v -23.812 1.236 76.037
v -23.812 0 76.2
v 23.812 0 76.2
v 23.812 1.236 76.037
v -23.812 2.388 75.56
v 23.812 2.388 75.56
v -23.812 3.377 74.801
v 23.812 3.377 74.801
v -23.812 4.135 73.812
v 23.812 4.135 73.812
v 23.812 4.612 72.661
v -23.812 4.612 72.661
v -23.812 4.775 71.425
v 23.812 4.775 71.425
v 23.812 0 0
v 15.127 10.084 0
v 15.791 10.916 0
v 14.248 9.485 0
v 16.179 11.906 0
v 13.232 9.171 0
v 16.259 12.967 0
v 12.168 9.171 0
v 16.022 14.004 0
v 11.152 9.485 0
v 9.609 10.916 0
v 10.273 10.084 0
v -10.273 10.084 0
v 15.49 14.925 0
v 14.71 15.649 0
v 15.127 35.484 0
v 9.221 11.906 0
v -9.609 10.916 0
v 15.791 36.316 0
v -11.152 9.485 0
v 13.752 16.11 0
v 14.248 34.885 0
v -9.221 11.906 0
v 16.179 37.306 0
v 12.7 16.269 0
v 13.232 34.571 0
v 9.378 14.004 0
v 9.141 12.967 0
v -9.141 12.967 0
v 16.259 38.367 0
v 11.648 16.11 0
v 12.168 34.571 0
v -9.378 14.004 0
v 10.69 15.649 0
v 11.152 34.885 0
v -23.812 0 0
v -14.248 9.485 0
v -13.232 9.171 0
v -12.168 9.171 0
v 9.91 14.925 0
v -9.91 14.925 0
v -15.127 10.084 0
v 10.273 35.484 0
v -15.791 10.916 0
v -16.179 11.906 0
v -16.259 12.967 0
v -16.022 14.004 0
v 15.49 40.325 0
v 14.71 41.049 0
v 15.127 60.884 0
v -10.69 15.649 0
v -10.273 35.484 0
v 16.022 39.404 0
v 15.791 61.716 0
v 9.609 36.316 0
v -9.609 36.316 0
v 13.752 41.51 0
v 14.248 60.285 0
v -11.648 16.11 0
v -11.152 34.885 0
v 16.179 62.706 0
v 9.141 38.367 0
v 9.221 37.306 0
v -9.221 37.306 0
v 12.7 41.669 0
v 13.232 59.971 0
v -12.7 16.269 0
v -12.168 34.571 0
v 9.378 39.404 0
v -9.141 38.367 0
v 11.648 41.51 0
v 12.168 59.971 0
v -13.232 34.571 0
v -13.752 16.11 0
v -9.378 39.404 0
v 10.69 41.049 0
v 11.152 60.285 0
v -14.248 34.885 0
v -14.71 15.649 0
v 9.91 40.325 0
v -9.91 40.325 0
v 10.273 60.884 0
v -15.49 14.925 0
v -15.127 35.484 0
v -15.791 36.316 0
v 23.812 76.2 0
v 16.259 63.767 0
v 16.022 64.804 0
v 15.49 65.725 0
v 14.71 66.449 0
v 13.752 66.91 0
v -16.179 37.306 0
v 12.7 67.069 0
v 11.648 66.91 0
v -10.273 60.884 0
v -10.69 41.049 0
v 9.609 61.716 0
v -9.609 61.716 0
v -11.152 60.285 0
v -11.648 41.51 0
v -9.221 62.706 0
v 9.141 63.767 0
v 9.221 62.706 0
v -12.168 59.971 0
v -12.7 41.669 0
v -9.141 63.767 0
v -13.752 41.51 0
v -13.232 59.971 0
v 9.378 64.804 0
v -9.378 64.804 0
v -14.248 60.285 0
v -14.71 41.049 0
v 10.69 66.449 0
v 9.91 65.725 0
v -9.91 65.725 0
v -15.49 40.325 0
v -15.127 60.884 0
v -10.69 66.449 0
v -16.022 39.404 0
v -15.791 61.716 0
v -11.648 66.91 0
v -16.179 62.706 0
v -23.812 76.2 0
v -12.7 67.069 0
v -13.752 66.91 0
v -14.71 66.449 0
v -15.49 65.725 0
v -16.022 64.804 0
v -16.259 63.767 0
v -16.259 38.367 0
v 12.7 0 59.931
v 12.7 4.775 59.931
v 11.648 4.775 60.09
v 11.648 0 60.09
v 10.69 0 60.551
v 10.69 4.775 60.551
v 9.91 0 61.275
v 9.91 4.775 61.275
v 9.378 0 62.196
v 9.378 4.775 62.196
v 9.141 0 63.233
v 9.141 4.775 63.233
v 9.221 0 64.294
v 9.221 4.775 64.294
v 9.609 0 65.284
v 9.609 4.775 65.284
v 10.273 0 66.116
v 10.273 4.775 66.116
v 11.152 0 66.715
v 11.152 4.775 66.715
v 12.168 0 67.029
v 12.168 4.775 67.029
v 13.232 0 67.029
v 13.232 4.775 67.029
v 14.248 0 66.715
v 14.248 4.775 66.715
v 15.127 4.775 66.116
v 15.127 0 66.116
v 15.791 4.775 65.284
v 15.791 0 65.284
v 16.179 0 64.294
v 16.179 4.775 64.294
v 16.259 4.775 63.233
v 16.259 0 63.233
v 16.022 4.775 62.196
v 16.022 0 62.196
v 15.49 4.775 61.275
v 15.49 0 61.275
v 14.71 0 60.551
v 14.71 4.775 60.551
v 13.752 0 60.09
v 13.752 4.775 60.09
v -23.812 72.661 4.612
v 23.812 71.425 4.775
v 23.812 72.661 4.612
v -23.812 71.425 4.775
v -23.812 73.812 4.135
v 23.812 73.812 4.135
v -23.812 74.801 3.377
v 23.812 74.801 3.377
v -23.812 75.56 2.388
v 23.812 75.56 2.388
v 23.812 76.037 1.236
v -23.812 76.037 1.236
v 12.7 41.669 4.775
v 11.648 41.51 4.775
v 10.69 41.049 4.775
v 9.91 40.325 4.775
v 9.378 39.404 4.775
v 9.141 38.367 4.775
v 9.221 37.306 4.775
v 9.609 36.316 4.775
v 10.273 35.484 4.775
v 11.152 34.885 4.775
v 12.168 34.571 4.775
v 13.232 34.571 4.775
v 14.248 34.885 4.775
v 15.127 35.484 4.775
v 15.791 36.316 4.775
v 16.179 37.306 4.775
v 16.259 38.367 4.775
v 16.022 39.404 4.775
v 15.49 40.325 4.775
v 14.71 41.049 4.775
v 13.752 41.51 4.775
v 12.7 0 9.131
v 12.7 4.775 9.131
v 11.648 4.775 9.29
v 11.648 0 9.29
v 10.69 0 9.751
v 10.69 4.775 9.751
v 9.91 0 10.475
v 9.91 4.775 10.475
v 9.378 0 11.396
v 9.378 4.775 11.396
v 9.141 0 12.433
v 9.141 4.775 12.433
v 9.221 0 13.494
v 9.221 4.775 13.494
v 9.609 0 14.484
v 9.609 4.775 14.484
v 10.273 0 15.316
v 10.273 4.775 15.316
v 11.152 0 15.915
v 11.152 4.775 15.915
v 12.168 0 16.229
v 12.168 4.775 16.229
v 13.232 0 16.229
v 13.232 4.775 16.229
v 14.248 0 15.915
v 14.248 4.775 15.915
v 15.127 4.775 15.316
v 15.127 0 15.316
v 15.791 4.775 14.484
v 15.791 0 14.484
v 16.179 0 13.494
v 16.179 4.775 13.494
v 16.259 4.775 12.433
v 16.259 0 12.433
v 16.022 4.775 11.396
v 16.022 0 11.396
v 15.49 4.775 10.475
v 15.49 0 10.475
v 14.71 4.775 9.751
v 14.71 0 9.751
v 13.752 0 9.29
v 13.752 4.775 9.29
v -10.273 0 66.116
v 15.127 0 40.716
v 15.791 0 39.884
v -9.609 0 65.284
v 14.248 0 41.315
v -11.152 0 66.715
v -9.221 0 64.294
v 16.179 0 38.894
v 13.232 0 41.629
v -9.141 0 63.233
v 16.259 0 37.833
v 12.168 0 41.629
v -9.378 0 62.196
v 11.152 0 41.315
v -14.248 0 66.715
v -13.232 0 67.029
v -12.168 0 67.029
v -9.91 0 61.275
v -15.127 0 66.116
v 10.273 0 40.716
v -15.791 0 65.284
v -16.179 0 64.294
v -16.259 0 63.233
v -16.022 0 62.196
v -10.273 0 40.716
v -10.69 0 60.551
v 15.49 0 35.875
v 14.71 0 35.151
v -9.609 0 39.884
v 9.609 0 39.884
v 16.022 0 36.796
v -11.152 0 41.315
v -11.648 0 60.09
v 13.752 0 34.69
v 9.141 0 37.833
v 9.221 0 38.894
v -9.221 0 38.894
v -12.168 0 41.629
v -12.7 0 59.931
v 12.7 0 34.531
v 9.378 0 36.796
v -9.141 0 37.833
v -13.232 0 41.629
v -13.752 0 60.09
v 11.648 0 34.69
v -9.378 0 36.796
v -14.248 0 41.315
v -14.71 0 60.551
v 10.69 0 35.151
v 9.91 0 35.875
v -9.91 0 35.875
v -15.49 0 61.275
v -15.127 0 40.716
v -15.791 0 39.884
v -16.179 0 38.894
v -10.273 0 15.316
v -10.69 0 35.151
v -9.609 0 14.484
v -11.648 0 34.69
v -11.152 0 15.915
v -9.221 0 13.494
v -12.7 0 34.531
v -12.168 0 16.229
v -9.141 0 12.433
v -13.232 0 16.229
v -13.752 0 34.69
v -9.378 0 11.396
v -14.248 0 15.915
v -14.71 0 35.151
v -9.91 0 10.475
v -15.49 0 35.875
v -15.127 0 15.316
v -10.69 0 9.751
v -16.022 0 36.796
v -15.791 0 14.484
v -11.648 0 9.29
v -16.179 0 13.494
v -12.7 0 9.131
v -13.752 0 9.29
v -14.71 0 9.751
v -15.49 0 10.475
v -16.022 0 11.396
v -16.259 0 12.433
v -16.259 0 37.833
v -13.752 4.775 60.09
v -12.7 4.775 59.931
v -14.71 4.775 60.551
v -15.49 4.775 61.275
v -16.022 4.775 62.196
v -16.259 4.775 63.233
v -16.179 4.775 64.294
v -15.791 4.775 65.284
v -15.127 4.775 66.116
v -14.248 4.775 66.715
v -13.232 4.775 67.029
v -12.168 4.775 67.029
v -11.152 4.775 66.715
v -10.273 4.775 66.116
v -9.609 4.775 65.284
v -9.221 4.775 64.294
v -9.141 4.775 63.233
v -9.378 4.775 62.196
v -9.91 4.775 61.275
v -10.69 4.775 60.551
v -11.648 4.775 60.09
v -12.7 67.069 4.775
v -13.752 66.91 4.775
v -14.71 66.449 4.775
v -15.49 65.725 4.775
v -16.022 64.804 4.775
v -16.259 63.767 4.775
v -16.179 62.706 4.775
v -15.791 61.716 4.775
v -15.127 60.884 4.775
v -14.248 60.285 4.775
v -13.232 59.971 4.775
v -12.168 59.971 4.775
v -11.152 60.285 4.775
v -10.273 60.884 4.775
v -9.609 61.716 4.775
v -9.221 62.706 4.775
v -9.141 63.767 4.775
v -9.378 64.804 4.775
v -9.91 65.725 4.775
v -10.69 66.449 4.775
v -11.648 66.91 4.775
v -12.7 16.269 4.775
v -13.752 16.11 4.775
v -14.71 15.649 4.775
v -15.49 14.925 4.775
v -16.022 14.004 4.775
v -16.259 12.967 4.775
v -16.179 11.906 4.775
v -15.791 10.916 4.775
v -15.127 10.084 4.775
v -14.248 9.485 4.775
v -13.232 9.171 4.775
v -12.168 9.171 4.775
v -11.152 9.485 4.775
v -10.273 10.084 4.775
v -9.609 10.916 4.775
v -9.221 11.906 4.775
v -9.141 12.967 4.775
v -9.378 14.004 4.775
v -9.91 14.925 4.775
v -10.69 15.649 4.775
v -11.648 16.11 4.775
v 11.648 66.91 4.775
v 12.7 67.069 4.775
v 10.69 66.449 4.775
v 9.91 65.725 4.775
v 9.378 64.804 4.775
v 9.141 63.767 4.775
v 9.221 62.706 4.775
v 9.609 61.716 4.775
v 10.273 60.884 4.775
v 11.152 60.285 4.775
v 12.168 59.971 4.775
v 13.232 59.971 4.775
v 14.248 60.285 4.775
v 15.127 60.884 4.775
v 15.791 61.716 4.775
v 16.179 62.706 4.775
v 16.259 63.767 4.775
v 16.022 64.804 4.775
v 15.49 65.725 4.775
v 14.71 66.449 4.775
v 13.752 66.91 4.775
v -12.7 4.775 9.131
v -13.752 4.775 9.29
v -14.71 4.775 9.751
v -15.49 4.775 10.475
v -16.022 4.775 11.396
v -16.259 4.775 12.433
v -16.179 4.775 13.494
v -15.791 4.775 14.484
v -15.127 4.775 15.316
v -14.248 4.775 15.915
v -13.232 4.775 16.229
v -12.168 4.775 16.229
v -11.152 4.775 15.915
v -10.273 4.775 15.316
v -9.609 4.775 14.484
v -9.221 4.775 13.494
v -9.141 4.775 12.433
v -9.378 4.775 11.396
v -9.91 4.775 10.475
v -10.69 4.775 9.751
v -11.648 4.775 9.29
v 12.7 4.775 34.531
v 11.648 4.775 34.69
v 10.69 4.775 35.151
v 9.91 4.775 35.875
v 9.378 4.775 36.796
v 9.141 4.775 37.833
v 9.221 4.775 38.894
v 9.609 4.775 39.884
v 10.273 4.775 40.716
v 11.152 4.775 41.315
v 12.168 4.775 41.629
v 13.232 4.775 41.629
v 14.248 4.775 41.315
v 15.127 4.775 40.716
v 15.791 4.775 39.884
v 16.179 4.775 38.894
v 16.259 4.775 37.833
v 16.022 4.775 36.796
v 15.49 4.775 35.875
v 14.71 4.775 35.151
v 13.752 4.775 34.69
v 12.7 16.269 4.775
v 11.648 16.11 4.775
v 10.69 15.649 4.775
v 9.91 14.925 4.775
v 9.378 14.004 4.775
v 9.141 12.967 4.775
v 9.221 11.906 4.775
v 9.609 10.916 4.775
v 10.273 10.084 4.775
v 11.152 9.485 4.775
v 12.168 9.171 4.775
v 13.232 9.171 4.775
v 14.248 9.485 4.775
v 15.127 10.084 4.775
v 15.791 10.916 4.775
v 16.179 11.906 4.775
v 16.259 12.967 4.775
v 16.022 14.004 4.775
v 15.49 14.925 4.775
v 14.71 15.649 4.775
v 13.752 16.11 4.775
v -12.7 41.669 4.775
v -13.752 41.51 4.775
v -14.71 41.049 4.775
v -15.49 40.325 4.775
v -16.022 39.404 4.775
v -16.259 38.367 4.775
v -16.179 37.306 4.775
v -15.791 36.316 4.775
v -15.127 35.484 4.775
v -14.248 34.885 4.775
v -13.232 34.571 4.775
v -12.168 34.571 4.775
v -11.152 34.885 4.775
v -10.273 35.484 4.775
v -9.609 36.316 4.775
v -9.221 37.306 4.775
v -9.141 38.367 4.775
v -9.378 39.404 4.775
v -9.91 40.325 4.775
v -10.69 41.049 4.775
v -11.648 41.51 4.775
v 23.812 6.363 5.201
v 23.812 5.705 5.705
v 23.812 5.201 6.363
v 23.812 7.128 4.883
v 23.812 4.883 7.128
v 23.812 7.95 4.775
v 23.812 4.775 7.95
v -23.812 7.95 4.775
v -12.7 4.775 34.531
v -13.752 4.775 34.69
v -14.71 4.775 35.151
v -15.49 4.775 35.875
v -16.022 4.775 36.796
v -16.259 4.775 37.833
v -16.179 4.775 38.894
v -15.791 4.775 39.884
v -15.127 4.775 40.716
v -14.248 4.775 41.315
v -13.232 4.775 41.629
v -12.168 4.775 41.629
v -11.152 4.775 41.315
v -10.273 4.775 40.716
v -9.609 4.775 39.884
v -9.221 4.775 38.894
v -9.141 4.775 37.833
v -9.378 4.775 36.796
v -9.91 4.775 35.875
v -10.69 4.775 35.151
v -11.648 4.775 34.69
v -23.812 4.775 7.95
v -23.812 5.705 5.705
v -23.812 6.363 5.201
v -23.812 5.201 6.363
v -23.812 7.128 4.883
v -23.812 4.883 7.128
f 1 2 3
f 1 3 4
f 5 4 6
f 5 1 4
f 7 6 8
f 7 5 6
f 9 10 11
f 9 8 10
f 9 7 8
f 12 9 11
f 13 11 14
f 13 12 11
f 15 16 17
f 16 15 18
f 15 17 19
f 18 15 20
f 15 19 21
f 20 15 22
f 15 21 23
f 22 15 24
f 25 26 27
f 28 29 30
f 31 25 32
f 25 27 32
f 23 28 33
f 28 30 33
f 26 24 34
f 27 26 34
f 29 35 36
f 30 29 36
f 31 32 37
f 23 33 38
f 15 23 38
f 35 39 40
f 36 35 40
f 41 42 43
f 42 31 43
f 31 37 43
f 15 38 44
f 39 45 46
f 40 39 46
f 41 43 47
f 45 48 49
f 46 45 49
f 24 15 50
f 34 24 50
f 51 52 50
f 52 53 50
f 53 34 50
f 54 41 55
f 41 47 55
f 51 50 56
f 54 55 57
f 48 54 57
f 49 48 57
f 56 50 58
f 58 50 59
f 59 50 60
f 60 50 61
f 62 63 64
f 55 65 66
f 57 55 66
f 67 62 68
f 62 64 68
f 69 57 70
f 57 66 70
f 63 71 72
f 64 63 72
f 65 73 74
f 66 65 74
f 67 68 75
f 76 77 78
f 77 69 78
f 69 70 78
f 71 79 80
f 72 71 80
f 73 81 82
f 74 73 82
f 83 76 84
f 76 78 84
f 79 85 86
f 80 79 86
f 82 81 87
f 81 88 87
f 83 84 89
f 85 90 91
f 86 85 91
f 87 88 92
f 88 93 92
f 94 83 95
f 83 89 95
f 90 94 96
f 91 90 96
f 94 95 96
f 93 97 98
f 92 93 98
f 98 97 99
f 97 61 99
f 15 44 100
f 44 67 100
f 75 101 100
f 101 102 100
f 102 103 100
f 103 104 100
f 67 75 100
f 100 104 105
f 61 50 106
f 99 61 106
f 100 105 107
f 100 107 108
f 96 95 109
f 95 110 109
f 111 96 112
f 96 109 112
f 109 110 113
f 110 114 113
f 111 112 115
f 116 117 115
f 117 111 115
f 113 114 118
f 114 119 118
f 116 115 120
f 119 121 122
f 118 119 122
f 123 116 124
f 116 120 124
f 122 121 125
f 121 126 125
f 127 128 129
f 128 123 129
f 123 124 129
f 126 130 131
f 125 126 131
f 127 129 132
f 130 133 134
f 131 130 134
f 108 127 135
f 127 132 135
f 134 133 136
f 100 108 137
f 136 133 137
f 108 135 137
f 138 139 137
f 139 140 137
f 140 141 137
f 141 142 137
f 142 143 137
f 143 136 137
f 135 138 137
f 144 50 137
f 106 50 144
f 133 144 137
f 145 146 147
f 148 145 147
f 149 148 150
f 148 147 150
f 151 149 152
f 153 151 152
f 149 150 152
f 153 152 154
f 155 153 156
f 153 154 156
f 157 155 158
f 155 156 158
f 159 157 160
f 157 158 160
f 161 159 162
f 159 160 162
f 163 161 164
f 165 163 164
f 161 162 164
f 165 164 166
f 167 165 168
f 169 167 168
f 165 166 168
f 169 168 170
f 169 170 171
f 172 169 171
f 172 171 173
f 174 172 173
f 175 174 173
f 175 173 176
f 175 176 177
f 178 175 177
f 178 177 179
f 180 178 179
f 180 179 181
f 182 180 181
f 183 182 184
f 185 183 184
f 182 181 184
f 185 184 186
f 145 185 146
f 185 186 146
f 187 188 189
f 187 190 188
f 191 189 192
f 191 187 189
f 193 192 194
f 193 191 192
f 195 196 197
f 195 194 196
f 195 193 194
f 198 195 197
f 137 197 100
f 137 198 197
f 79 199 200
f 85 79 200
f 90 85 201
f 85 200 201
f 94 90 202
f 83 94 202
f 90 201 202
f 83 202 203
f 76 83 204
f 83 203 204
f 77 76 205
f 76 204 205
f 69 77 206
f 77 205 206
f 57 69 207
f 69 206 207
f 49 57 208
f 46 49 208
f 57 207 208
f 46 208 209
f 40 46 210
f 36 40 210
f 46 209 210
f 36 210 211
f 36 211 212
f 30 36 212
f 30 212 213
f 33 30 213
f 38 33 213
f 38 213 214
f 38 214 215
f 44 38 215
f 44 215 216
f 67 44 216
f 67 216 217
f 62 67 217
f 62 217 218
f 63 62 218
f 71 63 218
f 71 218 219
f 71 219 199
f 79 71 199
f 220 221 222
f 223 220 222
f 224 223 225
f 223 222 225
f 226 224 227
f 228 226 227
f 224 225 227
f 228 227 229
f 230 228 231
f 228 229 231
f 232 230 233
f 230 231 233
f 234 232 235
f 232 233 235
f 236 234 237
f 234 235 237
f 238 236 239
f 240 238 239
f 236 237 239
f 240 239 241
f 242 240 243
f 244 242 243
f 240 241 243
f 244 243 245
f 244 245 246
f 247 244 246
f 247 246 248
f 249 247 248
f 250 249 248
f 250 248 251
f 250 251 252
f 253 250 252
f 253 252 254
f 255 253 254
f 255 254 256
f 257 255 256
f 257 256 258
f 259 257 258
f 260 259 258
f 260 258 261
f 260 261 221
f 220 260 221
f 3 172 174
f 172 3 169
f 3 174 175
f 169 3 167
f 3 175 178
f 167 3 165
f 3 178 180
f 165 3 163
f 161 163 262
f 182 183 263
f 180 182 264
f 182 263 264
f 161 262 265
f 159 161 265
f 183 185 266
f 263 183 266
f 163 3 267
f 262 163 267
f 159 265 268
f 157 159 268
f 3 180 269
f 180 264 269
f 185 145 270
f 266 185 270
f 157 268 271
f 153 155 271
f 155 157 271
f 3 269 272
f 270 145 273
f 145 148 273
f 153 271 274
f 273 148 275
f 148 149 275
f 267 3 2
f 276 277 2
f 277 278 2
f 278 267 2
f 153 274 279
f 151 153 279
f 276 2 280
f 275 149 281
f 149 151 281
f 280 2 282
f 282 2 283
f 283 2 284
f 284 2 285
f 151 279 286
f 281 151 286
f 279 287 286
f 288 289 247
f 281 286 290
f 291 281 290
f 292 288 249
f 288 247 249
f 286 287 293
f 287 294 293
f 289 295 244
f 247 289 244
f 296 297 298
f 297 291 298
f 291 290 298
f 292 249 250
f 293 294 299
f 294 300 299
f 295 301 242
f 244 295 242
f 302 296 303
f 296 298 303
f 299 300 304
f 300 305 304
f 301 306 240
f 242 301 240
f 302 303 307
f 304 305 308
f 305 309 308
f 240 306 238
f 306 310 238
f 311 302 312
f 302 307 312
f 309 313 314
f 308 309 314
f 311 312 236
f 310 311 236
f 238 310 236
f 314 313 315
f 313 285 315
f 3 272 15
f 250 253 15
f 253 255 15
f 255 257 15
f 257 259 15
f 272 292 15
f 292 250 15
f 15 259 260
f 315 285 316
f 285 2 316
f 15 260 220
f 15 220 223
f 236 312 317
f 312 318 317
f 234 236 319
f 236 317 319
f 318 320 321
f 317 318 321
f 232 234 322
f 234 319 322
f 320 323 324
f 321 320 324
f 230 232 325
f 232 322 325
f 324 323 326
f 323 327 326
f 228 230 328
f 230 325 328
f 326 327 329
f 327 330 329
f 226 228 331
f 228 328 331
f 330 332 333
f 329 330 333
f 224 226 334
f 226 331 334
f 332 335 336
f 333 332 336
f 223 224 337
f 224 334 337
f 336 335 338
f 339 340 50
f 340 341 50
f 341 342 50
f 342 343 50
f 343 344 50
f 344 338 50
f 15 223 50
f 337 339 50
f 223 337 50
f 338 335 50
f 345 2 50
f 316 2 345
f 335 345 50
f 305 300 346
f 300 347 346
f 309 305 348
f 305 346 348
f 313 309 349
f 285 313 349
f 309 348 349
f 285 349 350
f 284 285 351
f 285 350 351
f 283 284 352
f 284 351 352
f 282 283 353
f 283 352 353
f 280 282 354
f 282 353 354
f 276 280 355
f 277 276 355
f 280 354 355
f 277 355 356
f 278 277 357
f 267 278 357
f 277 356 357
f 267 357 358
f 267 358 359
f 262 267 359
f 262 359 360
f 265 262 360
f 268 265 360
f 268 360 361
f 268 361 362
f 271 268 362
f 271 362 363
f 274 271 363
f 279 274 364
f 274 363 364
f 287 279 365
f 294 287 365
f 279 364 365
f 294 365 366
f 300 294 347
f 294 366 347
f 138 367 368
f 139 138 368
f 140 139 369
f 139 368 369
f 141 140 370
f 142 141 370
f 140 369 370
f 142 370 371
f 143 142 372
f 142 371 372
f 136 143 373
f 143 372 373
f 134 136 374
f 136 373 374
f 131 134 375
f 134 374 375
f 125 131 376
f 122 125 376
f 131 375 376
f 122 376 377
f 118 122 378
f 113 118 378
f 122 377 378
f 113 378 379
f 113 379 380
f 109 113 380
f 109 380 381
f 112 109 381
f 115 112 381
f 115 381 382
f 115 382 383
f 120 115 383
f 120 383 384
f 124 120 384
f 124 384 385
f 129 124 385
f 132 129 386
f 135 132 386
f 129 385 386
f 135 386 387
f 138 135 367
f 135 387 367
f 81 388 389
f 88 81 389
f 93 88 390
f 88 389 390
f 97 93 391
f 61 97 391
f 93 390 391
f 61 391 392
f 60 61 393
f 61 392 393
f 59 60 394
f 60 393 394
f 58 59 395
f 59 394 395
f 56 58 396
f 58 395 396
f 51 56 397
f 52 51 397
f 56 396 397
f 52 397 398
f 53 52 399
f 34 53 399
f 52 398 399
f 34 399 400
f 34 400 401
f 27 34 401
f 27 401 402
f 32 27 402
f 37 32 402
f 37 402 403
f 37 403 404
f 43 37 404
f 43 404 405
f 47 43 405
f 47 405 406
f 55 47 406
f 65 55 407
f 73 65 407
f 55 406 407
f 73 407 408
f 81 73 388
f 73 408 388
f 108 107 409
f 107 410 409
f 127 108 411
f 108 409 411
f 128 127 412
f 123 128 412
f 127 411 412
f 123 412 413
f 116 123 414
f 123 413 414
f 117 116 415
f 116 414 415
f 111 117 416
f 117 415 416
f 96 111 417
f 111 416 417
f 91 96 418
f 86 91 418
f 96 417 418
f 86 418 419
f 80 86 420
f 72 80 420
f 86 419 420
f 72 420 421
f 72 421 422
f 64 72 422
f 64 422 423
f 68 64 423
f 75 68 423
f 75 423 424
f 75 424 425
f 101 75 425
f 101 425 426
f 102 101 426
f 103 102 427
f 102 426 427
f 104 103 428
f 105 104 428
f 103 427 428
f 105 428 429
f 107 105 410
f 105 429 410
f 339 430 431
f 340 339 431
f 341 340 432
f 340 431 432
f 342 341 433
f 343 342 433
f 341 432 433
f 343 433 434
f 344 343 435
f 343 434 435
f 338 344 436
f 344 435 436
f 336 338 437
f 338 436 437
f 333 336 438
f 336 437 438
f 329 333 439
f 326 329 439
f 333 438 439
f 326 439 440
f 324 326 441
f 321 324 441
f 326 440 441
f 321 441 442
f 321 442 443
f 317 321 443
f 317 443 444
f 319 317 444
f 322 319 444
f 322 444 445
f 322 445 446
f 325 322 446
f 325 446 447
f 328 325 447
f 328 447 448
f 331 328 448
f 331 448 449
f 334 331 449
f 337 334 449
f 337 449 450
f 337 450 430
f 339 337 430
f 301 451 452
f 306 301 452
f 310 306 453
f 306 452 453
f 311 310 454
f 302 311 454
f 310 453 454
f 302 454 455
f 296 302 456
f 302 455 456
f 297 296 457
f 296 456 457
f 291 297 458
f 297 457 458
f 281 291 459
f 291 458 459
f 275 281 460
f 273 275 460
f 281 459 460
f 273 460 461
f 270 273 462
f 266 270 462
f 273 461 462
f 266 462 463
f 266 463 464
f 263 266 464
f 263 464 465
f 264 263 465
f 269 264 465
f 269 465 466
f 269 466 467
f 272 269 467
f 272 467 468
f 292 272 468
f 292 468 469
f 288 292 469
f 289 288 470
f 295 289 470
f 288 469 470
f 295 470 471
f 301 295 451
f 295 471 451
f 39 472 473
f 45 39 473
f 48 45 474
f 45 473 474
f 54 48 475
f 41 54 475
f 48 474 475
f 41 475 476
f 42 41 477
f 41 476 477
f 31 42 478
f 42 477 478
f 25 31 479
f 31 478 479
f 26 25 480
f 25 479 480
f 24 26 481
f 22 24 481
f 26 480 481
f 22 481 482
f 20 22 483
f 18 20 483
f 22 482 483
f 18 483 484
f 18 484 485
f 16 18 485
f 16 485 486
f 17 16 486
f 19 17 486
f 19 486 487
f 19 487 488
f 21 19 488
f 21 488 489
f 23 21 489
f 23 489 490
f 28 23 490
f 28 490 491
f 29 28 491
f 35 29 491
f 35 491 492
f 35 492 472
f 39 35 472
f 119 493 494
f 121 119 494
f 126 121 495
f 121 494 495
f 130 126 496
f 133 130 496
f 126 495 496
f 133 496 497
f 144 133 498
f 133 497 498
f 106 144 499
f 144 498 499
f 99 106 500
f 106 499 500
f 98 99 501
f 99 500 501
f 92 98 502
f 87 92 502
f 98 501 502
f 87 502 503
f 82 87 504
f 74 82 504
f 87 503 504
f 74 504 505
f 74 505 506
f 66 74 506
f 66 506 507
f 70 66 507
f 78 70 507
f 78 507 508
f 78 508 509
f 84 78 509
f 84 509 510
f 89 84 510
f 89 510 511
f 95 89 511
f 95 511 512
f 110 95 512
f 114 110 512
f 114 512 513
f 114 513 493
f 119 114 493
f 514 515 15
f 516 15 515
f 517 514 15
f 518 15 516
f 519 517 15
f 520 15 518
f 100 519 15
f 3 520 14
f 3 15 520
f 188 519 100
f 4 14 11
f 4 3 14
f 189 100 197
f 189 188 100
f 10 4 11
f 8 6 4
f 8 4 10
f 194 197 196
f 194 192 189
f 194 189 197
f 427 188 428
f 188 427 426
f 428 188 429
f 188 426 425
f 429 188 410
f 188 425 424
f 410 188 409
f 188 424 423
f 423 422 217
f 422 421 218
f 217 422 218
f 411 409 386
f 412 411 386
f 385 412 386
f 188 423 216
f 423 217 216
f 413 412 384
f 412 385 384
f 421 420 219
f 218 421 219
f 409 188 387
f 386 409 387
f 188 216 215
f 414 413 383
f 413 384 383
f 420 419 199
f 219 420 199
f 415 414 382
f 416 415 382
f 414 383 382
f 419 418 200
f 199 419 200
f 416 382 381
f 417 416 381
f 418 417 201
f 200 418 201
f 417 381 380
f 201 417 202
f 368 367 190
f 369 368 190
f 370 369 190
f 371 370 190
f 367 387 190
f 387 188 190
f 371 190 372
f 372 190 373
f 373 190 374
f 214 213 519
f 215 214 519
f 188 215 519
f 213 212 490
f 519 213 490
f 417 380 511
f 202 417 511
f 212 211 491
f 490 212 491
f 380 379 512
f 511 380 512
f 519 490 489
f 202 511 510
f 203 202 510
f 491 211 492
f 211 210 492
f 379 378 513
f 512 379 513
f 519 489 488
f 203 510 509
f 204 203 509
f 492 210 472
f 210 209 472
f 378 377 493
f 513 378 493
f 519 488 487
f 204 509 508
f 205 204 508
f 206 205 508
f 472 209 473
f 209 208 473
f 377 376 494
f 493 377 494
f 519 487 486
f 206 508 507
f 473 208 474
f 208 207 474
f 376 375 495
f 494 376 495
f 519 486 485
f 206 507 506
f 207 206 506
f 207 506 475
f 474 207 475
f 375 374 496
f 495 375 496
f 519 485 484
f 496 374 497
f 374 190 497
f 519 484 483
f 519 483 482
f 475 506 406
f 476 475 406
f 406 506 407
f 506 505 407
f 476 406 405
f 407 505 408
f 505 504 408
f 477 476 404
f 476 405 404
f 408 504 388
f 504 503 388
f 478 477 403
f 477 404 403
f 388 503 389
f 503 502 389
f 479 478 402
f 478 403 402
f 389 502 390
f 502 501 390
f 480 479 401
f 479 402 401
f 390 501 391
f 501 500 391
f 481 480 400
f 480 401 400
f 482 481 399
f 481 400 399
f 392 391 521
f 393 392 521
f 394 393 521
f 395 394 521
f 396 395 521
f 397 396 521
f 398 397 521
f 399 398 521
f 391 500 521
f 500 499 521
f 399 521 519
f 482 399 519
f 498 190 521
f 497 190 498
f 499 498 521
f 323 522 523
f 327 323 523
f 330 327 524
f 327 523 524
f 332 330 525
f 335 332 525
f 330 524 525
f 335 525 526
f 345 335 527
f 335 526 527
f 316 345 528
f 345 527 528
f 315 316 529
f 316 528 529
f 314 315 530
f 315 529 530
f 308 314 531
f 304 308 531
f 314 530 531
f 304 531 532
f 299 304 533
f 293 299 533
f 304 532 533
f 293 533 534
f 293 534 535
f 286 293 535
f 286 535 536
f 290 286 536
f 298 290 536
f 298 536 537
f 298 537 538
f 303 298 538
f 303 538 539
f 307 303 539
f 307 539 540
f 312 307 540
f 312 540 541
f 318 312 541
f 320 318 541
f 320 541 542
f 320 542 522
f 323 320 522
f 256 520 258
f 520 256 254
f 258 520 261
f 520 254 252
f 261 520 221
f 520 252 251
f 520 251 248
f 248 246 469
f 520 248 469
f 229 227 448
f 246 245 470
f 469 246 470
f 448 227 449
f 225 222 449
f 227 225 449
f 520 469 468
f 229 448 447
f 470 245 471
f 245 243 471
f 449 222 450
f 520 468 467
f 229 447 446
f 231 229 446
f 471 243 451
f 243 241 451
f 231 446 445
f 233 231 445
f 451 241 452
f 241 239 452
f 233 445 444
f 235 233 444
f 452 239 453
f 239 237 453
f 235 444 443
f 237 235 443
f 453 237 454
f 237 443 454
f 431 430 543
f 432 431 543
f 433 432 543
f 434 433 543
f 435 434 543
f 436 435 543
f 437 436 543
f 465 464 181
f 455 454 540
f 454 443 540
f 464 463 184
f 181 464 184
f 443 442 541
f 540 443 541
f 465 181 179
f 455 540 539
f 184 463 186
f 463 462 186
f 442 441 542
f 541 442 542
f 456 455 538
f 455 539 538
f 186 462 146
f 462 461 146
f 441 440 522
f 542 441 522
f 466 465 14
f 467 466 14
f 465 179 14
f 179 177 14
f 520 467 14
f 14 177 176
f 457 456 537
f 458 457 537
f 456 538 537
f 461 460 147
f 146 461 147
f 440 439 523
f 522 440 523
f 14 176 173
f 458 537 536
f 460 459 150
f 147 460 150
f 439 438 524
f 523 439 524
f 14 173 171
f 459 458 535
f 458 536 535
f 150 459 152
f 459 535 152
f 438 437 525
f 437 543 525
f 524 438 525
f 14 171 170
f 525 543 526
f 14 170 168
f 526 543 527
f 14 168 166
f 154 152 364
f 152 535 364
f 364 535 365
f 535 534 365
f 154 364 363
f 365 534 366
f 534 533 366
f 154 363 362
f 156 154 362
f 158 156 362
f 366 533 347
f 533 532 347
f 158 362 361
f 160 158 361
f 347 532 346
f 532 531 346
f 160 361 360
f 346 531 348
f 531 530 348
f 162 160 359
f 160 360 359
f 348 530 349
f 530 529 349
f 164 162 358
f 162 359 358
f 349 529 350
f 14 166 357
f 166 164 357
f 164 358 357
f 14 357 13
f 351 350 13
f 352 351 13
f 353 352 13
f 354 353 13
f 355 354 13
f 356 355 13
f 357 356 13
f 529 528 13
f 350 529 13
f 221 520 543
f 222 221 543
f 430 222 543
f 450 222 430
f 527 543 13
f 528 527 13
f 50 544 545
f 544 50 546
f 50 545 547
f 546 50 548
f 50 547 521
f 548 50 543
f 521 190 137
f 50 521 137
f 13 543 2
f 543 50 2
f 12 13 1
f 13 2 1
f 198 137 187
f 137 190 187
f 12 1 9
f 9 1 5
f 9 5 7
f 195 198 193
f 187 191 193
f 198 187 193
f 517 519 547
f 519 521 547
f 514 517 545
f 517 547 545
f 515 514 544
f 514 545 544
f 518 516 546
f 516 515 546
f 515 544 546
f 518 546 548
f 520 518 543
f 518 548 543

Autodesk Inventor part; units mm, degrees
ref_plane "YZ Plane" through (0, 0, 0) normal (1, 0, 0) x (0, 1, 0)
ref_plane "XZ Plane" through (0, 0, 0) normal (0, 1, 0) x (-1, 0, 0)
ref_plane "XY Plane" through (0, 0, 0) normal (0, 0, 1) x (1, 0, 0)
sketch "Sketch_1" plane through (0, 0, 0) normal (1, 0, 0) x (0, 1, 0)
  line L0 (0, 76.2) -> (0, 0)
  line L1 (0, 0) -> (76.2, 0)
  arc A0 (76.2, 0) -> (71.4248, 4.7752) centre (71.4248, 0) ccw
  line L2 (71.4248, 4.7752) -> (7.9502, 4.7752)
  arc A1 (4.7752, 7.9502) -> (7.9502, 4.7752) centre (7.9502, 7.9502) ccw
  line L3 (4.7752, 7.9502) -> (4.7752, 71.4248)
  arc A2 (4.7752, 71.4248) -> (0, 76.2) centre (0, 71.4248) ccw
extrude "Extrusion1" add sketch "Sketch_1" along normal mid plane 47.625
sketch "Sketch2" plane through (23.8125, 0, 0) normal (0, 0, -1) x (-1, 0, 0)
  point P0 (11.1125, 63.5)
hole "Hole1" at (12.7, 63.5, 0) direction (0, 0, 1) diameter 7.1374 depth 5.2527
sketch "Sketch3" plane through (23.8125, 0, 0) normal (0, 0, -1) x (-1, 0, 0)
  point P0 (36.5125, 38.1)
hole "Hole2" at (-12.7, 38.1, 0) direction (0, 0, 1) diameter 7.1374 depth 5.2527
sketch "Sketch4" plane through (23.8125, 0, 0) normal (0, 0, -1) x (-1, 0, 0)
  point P0 (36.5125, 63.5)
hole "Hole3" at (-12.7, 63.5, 0) direction (0, 0, 1) diameter 7.1374 depth 5.2527
sketch "Sketch5" plane through (-23.8125, 0, 76.2) normal (0, -1, 0) x (1, 0, 0)
  point P0 (36.5125, -38.1)
hole "Hole4" at (12.7, 0, 38.1) direction (0, 1, 0) diameter 7.1374 depth 5.2527
sketch "Sketch6" plane through (-23.8125, 0, 76.2) normal (0, -1, 0) x (1, 0, 0)
  point P0 (36.5125, -12.7)
hole "Hole5" at (12.7, 0, 63.5) direction (0, 1, 0) diameter 7.1374 depth 5.2527
sketch "Sketch7" plane through (-23.8125, 0, 76.2) normal (0, -1, 0) x (1, 0, 0)
  point P0 (11.1125, -38.1)
hole "Hole6" at (-12.7, 0, 38.1) direction (0, 1, 0) diameter 7.1374 depth 5.2527
sketch "Sketch8" plane through (-23.8125, 0, 76.2) normal (0, -1, 0) x (1, 0, 0)
  point P0 (11.1125, -12.7)
hole "Hole7" at (-12.7, 0, 63.5) direction (0, 1, 0) diameter 7.1374 depth 5.2527
sketch "Sketch9" plane through (23.8125, 0, 0) normal (0, 0, -1) x (-1, 0, 0)
  point P0 (11.1125, 38.1)
hole "Hole8" at (12.7, 38.1, 0) direction (0, 0, 1) diameter 7.1374 depth 5.2527
sketch "Sketch10" plane through (23.8125, 0, 0) normal (0, 0, -1) x (-1, 0, 0)
  point P0 (11.1125, 12.7)
hole "Hole9" at (12.7, 12.7, 0) direction (0, 0, 1) diameter 7.1374 depth 5.2527
sketch "Sketch11" plane through (23.8125, 0, 0) normal (0, 0, -1) x (-1, 0, 0)
  point P0 (36.5125, 12.7)
hole "Hole10" at (-12.7, 12.7, 0) direction (0, 0, 1) diameter 7.1374 depth 5.2527
sketch "Sketch12" plane through (-23.8125, 0, 76.2) normal (0, -1, 0) x (1, 0, 0)
  point P0 (36.5125, -63.5)
hole "Hole11" at (12.7, 0, 12.7) direction (0, 1, 0) diameter 7.1374 depth 5.2527
sketch "Sketch13" plane through (-23.8125, 0, 76.2) normal (0, -1, 0) x (1, 0, 0)
  point P0 (11.1125, -63.5)
hole "Hole12" at (-12.7, 0, 12.7) direction (0, 1, 0) diameter 7.1374 depth 5.2527
properties part number "4014"
